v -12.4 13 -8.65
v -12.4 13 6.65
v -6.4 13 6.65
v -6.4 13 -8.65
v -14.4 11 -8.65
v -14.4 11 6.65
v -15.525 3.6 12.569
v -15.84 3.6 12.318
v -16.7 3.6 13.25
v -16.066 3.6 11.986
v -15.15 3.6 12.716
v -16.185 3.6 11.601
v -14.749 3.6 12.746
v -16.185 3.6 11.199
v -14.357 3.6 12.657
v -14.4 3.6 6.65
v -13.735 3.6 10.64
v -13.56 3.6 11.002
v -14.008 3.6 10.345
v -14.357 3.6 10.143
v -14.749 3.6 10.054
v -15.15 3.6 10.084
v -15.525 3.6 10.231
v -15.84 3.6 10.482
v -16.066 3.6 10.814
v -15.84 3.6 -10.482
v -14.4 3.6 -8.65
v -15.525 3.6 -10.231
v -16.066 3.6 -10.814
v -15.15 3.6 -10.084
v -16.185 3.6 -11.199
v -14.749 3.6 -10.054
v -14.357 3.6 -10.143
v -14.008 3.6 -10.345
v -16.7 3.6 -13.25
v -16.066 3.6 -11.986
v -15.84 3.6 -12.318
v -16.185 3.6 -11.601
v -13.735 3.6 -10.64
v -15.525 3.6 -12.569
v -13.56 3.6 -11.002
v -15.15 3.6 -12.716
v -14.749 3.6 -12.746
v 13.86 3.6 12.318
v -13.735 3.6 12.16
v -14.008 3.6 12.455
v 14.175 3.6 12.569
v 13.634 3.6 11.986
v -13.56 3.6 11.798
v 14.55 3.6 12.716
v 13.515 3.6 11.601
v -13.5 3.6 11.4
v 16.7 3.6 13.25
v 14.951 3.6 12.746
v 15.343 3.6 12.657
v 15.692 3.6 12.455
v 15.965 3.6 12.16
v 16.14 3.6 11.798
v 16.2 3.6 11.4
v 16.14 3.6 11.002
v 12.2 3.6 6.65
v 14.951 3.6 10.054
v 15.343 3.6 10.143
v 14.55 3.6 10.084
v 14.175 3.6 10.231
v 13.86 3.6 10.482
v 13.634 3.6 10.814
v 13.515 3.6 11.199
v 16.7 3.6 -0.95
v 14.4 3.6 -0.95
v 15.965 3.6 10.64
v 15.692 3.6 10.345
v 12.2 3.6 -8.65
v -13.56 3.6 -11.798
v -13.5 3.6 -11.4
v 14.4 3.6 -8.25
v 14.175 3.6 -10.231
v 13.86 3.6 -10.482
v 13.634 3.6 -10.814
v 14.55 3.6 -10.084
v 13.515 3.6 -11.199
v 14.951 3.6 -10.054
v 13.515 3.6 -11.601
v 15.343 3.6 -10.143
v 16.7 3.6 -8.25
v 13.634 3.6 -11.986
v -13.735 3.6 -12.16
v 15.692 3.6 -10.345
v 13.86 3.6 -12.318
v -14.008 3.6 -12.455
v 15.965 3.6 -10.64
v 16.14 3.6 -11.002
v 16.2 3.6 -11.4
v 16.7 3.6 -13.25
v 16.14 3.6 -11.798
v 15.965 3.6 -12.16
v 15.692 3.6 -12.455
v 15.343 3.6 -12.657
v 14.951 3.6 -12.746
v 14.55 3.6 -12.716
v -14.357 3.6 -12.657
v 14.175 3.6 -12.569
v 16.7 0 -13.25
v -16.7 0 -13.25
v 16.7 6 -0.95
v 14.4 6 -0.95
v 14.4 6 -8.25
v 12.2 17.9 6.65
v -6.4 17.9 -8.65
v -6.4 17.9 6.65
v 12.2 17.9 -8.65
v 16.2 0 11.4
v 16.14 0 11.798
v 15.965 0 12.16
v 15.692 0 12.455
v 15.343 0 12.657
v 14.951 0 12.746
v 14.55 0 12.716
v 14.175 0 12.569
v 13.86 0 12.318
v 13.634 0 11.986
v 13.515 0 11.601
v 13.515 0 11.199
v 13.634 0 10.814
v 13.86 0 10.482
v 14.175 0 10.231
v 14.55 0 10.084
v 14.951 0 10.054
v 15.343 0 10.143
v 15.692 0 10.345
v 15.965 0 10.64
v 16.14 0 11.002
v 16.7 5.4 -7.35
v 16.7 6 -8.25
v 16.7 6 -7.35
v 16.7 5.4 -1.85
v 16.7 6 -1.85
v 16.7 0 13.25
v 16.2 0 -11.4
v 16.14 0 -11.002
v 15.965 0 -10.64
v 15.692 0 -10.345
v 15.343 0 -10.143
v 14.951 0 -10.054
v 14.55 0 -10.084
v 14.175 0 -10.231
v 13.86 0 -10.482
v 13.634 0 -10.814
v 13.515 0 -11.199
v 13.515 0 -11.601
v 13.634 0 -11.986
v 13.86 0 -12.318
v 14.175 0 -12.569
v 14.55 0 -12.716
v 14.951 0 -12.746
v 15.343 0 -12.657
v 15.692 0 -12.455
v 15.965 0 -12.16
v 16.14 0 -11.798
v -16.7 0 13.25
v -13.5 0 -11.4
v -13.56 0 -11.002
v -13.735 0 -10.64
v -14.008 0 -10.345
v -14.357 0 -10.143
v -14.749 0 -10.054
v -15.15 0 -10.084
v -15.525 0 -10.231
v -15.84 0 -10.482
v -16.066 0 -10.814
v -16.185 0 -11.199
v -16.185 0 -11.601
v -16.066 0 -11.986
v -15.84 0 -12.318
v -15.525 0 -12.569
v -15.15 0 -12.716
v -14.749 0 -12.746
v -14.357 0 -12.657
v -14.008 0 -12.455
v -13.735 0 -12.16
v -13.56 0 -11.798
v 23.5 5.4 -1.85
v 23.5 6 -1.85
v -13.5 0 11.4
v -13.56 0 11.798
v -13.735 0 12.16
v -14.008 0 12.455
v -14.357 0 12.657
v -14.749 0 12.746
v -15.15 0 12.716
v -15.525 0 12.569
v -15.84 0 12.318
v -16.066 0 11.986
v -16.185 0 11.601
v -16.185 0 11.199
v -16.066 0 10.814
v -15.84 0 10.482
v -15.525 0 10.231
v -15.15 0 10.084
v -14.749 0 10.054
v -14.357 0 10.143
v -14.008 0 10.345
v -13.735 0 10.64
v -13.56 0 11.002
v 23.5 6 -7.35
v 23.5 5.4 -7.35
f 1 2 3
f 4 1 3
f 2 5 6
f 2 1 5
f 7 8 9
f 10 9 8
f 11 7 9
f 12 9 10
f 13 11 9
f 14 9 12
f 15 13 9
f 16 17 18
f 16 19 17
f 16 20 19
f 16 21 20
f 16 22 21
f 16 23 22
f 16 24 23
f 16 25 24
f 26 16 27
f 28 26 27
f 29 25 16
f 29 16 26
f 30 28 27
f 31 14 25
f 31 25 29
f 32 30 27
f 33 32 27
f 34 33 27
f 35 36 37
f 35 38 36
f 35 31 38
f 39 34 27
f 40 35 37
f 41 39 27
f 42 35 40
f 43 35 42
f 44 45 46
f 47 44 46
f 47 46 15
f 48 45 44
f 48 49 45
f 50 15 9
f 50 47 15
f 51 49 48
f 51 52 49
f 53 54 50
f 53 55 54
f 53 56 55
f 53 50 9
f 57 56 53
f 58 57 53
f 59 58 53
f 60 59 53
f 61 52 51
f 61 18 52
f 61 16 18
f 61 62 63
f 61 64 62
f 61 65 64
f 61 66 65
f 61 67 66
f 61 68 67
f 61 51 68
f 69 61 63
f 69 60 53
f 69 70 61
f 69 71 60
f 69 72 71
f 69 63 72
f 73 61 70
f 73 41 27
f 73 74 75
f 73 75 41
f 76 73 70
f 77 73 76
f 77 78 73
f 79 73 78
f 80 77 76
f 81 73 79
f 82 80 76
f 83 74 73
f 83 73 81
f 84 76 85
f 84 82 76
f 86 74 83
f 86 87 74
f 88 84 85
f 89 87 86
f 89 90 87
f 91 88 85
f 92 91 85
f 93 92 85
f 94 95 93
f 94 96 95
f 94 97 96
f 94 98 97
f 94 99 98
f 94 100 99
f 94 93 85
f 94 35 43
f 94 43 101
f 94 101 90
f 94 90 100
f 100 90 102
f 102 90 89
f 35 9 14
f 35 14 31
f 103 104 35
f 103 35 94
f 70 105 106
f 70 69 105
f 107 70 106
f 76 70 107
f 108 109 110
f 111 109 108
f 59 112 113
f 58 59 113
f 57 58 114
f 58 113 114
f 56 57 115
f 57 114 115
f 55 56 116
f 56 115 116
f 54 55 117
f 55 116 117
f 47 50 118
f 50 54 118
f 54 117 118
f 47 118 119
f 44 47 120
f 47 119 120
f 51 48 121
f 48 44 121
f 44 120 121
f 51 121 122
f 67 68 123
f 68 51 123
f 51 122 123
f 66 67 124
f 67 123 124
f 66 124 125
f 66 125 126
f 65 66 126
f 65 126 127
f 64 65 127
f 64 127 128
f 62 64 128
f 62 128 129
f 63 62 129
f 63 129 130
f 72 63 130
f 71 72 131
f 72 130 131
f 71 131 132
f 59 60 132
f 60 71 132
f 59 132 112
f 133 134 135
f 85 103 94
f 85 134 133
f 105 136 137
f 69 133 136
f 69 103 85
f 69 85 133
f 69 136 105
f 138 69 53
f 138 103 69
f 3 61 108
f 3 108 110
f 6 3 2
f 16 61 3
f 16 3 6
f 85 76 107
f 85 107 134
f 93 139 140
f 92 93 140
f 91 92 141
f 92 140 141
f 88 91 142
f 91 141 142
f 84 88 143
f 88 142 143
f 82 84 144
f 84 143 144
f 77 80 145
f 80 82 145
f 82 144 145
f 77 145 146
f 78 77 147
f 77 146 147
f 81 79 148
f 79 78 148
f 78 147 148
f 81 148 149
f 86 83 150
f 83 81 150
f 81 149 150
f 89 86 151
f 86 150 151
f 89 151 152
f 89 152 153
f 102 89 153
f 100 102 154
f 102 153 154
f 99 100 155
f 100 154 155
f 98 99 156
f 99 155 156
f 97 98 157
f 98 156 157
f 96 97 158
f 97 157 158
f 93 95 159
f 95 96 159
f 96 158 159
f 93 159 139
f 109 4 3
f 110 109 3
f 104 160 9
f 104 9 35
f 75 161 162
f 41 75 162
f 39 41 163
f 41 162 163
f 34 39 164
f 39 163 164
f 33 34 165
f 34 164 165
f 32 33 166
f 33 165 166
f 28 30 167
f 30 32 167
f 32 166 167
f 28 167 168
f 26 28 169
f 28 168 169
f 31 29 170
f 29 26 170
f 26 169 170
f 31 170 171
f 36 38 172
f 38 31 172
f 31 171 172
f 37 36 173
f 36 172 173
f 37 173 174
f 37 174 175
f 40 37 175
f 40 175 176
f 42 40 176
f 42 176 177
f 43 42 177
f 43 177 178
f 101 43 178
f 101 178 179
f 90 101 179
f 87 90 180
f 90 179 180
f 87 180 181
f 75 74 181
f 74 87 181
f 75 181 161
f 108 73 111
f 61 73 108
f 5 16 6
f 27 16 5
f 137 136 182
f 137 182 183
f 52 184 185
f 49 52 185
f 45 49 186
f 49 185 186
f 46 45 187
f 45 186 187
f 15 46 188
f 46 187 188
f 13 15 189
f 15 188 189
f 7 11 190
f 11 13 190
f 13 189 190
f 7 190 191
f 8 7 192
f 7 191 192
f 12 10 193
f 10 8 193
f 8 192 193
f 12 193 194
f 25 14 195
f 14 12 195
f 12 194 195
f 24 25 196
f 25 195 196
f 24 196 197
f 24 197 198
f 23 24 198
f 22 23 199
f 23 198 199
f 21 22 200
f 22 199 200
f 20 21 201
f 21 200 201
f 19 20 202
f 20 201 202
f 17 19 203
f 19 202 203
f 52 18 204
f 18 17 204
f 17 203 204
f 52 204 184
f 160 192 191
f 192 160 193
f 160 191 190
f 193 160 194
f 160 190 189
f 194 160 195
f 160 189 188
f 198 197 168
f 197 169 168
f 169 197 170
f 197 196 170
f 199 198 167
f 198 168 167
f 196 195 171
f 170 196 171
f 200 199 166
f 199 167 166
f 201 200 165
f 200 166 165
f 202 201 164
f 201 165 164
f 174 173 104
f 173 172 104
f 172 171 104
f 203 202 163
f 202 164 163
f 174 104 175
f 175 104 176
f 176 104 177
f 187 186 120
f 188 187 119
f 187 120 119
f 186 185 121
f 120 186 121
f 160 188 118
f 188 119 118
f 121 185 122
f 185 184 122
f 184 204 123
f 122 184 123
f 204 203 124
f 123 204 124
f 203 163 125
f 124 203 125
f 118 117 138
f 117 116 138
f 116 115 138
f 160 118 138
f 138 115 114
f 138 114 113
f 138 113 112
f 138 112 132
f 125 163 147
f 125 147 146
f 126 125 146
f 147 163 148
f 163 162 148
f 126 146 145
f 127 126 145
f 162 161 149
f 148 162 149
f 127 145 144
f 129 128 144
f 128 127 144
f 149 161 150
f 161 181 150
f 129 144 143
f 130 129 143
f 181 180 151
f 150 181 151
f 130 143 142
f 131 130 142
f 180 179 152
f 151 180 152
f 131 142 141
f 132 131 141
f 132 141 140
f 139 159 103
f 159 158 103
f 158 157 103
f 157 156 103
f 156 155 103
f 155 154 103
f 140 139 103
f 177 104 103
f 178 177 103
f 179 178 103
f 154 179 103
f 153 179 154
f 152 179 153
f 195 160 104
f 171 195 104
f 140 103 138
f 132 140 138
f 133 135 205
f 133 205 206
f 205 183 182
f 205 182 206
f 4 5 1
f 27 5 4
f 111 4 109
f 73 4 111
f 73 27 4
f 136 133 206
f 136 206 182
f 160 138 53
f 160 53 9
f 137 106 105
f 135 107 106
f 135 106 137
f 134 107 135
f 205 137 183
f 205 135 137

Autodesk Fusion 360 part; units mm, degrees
sketch "Boceto1" plane through (0, 0, 0) normal (0, 1, 0) x (1, 0, 0)
  line L0 (16.7, -13.25) -> (-16.7, -13.25)
  line L1 (-16.7, -13.25) -> (-16.7, 13.25)
  line L2 (-16.7, 13.25) -> (16.7, 13.25)
  line L3 (16.7, 13.25) -> (16.7, -13.25)
  line L4 (16.7, -13.25) -> (-16.7, 13.25) construction
  line L5 (-16.7, -13.25) -> (16.7, 13.25) construction
  line L6 (-14.4, 8.65) -> (12.2, 8.65)
  line L7 (12.2, 8.65) -> (12.2, -6.65)
  line L8 (12.2, -6.65) -> (-14.4, -6.65)
  line L9 (-14.4, -6.65) -> (-14.4, 8.65)
  line L10 (-6.4, 8.65) -> (-6.4, -6.65)
  circle A0 centre (-14.85, 11.4) radius 1.35
  circle A1 centre (14.85, 11.4) radius 1.35
  circle A2 centre (14.85, -11.4) radius 1.35
  circle A3 centre (-14.85, -11.4) radius 1.35
  line L11 (14.4, 8.25) -> (16.7, 8.25)
  line L12 (16.7, 8.25) -> (16.7, 0.95)
  line L13 (16.7, 0.95) -> (14.4, 0.95)
  line L14 (14.4, 0.95) -> (14.4, 8.25)
  dimension "d1" = 33.4
  dimension "d2" = 26.5
  dimension "d3" = 26.6
  dimension "d4" = 15.3
  dimension "d5" = 4.6
  dimension "d6" = 4.5
  dimension "d8" = 8
  dimension "d16" = 2.7
  dimension "d17" = 1.85
  dimension "d18" = 1.85
  dimension "d19" = 1.85
  dimension "d20" = 1.85
  dimension "d21" = 5
  dimension "d22" = 2.3
  dimension "d23" = 7.3
extrude "Extruir1" add sketch "Boceto1" along normal blind 3.6 contours L0 L1 L2 L3 L11 L13 L14 | L3 L11 L12 L13 L14 | L6 L8 L9 L10 | L6 L7 L8 L10
extrude "Extruir2" add sketch "Boceto1" along normal blind 17.9 contours L6 L7 L8 L10
extrude "Extruir3" add sketch "Boceto1" along normal blind 13 contours L6 L8 L9 L10
chamfer "Chaflán1" distance 2 angle 45 1 edges at (-14.4, 13, -1)
extrude "Extruir4" add sketch "Boceto1" along normal blind 6 contours L3 L11 L12 L13 L14
sketch "Boceto2" plane through (16.7, 0, 0) normal (1, 0, 0) x (0, 0, -1)
  line L0 (0.95, 3.6) -> (-13.25, 3.6)
  line L1 (-13.25, 3.6) -> (-13.25, 0)
  line L2 (-13.25, 0) -> (13.25, 0)
  line L3 (13.25, 0) -> (13.25, 3.6)
  line L4 (13.25, 3.6) -> (8.25, 3.6)
  line L5 (8.25, 3.6) -> (8.25, 6)
  line L6 (8.25, 6) -> (0.95, 6)
  line L7 (0.95, 6) -> (0.95, 3.6)
  line L8 (1.85, 6) -> (7.35, 6)
  line L9 (7.35, 6) -> (7.35, 5.4)
  line L10 (7.35, 5.4) -> (1.85, 5.4)
  line L11 (1.85, 5.4) -> (1.85, 6)
  point P0 (4.6, 6)
  point P1 (4.6, 6)
  dimension "d26" = 0.6
  dimension "d27" = 5.5
extrude "Extruir5" add sketch "Boceto2" along normal blind 6.8 contours L6 L8 L9 L10 L11
equation "d9 = 1.2 mm + 2.4 mm"
equation "d11 = 16.7 mm + 1.2 mm"
equation "d17 = 0.5 mm + ( ( 2.7 / 2 ) * 1 mm )"
equation "d18 = 0.5 mm + ( ( 2.7 / 2 ) * 1 mm )"
equation "d19 = 0.5 mm + ( ( 2.7 / 2 ) * 1 mm )"
equation "d20 = 0.5 mm + ( ( 2.7 / 2 ) * 1 mm )"
